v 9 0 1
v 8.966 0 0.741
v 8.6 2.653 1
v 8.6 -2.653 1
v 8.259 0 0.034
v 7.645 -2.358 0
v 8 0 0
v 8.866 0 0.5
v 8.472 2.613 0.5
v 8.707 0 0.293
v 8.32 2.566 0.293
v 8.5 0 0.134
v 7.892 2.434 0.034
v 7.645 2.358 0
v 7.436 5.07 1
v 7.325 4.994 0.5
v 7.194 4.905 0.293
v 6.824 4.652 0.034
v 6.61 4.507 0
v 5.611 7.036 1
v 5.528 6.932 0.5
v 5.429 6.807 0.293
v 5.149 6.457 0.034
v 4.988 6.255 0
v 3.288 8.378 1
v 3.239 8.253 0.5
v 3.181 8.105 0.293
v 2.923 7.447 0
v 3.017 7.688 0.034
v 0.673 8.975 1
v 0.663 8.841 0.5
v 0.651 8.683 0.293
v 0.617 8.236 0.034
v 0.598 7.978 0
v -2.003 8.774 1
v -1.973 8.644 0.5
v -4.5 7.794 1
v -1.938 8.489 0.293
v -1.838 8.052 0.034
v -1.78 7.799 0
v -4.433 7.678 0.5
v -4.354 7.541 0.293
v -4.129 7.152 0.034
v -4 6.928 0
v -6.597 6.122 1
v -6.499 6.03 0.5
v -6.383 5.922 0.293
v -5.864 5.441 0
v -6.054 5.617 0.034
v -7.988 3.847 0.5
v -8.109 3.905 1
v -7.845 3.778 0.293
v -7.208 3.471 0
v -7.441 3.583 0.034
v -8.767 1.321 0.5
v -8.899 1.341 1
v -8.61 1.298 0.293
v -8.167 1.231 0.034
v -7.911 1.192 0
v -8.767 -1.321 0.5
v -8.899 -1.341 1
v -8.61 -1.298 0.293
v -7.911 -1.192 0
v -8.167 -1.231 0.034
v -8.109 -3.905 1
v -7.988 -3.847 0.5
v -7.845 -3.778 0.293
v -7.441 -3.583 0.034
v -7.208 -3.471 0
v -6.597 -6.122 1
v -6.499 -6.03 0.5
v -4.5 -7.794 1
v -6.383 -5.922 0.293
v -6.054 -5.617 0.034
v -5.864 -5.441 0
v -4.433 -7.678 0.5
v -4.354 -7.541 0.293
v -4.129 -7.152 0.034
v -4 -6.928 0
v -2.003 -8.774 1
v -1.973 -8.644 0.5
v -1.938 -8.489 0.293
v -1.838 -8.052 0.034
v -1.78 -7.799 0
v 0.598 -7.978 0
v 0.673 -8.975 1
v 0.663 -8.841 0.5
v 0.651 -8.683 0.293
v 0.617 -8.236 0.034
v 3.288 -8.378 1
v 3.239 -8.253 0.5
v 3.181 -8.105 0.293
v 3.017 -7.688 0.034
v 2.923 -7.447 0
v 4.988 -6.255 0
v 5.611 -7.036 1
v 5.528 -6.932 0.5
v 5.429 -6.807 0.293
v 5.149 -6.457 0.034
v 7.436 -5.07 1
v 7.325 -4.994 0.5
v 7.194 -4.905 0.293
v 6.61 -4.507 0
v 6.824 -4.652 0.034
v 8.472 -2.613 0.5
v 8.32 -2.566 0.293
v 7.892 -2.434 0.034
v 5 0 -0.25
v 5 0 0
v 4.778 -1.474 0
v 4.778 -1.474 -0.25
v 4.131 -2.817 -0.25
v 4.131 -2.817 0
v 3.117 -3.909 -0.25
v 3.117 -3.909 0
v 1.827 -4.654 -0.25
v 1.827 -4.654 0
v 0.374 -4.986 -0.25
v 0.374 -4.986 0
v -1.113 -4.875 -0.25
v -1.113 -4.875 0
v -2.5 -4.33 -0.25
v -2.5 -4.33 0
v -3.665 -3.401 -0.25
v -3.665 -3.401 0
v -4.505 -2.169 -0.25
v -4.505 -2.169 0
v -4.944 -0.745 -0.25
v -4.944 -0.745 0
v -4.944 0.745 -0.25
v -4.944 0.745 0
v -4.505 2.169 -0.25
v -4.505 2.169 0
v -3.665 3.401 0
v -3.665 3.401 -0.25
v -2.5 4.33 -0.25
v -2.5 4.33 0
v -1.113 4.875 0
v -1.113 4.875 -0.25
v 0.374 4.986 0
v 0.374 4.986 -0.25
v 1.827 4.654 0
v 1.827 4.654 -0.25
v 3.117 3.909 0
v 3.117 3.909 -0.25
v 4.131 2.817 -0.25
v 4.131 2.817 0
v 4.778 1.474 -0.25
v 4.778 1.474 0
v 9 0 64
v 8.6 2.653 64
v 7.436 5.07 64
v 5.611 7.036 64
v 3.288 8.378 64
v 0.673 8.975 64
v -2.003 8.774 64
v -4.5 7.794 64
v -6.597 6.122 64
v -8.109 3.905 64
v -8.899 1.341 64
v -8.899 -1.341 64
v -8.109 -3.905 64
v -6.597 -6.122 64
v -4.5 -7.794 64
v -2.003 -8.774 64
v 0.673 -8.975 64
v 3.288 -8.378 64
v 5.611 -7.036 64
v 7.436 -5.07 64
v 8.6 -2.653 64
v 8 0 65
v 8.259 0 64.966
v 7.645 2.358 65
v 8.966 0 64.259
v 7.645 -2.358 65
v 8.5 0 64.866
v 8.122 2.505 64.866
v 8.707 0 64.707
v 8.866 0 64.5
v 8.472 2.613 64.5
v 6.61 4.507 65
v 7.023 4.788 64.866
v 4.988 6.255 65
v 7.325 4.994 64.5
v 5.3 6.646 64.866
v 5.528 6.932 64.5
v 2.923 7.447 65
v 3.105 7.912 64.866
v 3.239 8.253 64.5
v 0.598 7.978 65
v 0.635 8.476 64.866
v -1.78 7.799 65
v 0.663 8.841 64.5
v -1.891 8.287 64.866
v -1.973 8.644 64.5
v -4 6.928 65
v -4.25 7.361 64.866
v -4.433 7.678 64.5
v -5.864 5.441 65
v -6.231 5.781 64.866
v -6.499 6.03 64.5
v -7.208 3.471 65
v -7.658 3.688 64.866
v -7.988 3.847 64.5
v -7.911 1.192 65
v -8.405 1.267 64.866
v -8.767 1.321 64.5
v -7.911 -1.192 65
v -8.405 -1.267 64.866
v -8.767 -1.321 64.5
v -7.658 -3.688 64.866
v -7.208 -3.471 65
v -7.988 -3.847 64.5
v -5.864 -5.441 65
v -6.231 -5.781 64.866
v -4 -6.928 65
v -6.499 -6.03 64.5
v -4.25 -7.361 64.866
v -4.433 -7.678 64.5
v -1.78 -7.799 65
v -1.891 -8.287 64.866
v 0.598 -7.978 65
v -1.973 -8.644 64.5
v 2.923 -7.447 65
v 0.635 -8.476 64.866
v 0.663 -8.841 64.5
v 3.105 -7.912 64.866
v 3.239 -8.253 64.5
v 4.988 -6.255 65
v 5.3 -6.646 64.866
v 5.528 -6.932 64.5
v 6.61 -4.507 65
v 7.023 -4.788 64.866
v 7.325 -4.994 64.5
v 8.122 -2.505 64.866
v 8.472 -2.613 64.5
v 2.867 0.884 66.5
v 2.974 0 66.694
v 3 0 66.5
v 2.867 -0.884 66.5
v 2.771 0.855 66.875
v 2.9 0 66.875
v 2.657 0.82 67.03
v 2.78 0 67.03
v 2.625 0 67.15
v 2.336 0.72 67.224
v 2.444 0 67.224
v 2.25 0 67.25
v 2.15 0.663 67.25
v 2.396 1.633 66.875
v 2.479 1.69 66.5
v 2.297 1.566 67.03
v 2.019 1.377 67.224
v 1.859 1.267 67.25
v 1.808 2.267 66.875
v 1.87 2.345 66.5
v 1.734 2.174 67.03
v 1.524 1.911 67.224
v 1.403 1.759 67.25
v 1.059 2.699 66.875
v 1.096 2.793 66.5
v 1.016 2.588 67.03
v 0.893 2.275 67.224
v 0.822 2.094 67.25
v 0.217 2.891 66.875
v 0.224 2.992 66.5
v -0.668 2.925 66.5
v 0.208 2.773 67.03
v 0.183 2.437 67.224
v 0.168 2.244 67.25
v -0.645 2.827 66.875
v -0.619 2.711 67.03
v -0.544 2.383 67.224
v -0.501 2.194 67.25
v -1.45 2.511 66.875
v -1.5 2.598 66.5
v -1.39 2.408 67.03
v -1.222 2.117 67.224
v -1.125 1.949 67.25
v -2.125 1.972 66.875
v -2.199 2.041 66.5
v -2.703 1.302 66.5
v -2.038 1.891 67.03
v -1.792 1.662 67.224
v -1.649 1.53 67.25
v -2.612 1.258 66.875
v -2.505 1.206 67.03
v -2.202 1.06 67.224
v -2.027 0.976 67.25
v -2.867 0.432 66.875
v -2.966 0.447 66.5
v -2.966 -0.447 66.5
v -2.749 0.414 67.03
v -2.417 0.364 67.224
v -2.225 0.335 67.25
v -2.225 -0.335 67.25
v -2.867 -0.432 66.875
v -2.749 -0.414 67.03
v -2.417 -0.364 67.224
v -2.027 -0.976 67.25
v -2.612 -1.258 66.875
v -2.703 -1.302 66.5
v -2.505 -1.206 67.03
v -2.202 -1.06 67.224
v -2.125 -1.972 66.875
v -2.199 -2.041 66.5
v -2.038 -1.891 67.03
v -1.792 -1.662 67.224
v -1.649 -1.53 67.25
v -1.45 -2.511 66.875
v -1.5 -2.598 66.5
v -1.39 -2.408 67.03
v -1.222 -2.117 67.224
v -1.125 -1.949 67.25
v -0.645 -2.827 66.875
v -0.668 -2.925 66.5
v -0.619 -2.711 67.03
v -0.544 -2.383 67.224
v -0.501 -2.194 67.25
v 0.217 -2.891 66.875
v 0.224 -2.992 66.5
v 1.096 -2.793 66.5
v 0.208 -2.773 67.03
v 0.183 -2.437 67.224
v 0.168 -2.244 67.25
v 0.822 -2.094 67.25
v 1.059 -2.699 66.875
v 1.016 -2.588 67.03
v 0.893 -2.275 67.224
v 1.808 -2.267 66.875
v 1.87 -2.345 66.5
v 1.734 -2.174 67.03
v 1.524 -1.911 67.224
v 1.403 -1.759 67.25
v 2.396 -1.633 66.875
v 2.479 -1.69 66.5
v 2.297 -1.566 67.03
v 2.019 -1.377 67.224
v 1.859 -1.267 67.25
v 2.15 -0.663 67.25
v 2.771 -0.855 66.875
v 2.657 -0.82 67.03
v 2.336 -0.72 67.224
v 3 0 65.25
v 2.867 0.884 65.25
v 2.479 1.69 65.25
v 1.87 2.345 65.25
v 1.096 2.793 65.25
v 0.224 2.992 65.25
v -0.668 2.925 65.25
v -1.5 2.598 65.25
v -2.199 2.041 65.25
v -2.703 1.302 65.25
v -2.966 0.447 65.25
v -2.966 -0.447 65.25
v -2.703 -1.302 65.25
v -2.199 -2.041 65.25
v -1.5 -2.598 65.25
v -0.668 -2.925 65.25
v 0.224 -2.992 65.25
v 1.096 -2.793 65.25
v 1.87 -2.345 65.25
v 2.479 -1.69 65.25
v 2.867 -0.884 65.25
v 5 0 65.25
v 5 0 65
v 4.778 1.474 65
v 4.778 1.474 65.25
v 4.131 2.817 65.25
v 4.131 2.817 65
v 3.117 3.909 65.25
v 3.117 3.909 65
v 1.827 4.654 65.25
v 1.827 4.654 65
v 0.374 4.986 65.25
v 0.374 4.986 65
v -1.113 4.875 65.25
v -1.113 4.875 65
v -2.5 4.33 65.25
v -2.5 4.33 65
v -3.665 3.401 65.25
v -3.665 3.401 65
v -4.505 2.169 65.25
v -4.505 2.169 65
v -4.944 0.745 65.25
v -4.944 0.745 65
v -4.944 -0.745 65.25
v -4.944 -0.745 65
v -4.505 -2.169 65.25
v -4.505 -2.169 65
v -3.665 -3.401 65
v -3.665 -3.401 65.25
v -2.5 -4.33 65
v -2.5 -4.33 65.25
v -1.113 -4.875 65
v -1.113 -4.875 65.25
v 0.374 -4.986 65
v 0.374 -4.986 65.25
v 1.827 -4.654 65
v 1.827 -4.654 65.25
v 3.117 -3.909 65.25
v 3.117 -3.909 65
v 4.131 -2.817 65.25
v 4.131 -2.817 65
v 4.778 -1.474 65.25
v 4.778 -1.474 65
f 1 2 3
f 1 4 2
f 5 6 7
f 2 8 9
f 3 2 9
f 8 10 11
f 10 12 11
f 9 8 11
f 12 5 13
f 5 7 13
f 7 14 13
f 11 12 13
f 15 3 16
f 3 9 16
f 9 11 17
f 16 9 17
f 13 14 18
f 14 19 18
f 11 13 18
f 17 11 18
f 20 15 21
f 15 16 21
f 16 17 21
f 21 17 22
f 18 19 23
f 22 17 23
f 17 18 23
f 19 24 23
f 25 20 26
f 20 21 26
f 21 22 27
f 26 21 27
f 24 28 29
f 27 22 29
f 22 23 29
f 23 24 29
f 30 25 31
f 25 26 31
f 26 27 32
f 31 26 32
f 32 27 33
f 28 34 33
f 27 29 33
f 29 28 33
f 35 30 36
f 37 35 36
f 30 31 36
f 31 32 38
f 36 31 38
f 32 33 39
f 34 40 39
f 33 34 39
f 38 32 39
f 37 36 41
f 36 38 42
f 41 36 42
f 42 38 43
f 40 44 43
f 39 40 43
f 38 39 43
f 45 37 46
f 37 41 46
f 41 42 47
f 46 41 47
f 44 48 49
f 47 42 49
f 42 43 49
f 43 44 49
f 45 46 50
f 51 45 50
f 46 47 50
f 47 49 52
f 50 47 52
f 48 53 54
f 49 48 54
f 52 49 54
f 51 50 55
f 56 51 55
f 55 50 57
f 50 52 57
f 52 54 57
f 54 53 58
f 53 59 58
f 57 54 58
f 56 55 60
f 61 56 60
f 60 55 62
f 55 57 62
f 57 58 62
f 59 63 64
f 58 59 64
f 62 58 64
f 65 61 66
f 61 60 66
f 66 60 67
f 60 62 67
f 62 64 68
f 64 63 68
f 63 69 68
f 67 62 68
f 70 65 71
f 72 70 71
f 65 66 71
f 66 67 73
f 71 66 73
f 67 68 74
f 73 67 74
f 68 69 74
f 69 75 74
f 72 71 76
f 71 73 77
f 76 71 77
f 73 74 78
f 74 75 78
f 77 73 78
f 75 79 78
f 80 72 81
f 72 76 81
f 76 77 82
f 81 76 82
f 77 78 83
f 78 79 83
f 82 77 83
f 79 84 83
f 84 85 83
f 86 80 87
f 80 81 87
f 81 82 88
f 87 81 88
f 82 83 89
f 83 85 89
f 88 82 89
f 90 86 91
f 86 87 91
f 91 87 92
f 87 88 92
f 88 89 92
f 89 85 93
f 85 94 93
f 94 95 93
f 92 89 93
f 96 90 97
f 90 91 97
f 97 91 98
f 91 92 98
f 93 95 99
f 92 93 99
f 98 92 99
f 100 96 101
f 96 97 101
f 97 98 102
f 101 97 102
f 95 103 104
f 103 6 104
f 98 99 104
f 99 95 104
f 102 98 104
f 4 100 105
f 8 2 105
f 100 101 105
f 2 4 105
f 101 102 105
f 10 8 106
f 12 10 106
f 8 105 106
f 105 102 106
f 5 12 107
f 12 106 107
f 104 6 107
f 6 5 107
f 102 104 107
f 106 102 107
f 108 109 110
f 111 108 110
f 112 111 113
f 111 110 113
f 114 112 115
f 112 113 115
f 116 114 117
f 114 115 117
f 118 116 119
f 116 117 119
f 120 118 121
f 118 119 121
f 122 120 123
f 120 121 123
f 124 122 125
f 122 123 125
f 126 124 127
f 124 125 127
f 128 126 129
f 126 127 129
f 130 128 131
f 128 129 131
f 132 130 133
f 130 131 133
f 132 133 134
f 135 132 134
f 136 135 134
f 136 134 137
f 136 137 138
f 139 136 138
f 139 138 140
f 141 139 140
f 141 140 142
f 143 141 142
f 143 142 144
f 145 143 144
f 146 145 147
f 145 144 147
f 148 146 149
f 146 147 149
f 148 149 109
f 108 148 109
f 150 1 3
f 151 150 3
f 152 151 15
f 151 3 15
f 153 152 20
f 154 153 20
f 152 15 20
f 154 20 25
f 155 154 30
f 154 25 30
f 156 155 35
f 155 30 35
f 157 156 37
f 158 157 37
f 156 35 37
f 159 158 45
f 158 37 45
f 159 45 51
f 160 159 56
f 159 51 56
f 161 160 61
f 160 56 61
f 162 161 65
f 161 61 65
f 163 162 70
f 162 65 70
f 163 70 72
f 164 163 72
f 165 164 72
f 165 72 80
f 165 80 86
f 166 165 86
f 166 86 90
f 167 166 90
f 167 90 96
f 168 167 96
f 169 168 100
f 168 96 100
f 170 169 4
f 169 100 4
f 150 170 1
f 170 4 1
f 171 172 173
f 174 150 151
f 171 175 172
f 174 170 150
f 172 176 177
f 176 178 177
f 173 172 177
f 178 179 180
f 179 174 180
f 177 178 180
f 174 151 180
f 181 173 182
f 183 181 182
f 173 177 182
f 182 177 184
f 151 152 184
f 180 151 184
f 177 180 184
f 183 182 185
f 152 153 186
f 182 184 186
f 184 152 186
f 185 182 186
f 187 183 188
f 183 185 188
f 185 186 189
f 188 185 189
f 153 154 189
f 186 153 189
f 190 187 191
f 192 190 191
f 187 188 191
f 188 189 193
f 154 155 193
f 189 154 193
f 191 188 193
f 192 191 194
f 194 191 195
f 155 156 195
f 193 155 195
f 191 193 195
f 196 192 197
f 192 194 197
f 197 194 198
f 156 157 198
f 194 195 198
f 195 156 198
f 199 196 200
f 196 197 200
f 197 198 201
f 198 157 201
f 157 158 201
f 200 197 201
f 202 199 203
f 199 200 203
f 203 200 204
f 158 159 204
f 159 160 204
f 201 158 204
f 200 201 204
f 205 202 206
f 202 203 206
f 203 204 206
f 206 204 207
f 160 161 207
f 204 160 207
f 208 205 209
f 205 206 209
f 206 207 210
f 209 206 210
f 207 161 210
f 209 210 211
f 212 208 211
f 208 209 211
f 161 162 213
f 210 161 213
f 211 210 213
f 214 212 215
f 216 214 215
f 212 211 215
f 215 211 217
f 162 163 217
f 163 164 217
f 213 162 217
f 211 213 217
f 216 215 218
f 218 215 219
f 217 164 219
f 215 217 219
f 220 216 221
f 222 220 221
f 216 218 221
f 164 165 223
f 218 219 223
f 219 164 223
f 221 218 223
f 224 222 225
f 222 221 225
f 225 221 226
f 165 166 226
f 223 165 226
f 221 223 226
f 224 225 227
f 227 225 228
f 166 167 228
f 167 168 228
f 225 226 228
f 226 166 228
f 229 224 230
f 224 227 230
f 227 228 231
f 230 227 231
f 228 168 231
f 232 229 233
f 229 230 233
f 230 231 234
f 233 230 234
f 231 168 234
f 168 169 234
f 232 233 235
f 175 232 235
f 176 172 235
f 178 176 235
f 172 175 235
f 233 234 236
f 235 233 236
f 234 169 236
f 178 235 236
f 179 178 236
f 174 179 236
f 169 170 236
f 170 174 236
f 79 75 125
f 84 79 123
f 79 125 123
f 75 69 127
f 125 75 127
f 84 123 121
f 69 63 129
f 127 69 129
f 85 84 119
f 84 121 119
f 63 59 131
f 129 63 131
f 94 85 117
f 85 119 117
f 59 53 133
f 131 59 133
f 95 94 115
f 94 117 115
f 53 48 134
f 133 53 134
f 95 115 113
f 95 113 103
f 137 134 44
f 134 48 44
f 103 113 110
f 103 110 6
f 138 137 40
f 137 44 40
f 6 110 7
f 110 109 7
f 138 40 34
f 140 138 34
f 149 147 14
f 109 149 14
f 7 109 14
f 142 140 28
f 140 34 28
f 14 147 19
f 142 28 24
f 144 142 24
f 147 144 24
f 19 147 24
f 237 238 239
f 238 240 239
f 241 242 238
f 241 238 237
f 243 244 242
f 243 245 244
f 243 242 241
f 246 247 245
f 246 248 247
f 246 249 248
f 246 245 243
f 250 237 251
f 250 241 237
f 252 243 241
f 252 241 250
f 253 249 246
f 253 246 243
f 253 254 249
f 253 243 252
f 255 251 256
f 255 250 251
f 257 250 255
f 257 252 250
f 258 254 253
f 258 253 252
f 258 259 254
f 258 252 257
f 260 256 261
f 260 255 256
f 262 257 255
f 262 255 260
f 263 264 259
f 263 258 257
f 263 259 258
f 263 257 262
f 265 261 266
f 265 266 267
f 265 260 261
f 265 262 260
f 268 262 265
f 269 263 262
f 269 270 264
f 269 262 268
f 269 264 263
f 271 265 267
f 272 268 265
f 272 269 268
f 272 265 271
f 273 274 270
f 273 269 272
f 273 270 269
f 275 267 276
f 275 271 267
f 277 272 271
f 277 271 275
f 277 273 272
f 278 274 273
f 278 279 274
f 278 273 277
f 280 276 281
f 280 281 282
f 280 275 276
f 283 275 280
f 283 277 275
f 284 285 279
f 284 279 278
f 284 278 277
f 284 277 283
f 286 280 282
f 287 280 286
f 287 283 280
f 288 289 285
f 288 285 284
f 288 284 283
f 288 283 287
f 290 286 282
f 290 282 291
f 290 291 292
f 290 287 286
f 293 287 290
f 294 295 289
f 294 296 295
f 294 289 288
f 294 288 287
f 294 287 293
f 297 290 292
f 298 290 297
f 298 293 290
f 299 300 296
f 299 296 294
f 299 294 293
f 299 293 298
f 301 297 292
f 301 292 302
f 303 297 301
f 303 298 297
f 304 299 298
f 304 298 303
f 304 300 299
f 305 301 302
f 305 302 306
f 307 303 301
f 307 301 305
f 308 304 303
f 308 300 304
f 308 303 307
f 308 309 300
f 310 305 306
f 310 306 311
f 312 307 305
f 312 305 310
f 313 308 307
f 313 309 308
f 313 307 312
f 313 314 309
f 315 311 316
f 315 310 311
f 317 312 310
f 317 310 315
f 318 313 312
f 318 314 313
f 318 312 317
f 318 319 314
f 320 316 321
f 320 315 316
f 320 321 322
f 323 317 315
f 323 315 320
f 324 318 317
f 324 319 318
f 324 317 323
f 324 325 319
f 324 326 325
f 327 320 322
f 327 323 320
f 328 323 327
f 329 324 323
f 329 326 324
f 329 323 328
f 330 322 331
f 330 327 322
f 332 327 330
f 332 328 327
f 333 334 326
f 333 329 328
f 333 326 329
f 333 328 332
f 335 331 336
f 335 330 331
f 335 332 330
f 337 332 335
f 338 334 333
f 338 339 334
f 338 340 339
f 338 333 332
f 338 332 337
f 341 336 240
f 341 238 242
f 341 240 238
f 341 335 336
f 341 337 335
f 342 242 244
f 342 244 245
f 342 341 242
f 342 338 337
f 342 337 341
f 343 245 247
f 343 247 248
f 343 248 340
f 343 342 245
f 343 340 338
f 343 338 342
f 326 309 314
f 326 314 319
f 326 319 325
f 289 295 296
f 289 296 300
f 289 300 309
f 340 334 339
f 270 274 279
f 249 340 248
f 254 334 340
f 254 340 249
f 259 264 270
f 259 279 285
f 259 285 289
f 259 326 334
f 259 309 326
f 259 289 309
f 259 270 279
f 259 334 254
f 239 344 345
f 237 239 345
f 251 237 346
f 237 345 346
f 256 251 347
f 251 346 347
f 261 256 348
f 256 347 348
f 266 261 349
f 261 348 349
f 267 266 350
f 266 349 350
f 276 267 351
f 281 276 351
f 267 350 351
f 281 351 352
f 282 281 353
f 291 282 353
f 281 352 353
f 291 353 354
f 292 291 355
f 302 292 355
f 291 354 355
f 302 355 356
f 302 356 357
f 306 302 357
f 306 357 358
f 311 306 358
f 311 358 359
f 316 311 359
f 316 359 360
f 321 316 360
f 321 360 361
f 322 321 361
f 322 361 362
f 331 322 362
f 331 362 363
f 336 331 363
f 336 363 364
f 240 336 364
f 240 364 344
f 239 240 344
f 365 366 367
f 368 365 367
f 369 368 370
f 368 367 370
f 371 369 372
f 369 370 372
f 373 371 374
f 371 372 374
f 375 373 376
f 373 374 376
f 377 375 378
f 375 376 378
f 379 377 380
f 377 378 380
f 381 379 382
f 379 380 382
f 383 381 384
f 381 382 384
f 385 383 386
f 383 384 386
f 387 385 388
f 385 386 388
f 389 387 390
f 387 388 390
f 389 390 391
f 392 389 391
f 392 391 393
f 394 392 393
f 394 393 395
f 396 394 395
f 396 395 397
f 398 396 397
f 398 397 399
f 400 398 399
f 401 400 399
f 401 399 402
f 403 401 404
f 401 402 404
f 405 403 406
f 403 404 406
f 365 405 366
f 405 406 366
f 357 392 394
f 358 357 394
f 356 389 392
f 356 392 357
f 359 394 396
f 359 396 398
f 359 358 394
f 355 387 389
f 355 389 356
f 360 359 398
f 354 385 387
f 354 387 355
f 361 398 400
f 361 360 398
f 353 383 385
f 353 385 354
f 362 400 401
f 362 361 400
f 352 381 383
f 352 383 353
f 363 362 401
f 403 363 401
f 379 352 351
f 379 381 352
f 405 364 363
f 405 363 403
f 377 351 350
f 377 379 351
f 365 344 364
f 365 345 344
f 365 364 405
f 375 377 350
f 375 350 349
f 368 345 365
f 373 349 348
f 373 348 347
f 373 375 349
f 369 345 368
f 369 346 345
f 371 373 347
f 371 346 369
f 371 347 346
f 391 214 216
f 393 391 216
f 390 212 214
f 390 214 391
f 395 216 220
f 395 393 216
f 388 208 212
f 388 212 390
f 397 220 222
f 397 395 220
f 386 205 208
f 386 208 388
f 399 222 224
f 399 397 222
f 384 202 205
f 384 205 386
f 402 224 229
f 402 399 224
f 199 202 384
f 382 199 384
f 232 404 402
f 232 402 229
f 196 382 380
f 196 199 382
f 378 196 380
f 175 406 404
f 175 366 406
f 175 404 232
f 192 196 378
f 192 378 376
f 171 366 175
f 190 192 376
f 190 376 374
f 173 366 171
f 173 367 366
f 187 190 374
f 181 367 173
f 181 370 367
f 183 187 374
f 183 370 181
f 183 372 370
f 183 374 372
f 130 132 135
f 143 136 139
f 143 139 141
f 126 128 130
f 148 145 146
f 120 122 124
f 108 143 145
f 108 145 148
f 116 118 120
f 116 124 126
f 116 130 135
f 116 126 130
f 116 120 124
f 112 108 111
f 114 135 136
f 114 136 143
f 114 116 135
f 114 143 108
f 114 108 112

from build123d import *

# Parameters (mm, degrees)
SKETCH_R     = 9
PAD_DEPTH    = 65
SKETCH001_R  = 3
PAD001_DEPTH = 2.25
FILLET_R     = 0.75
FILLET001_R  = 1
SKETCH002_R  = 5
PAD002_DEPTH = 0.25
SKETCH003_R  = 5
PAD003_DEPTH = 0.25


with BuildPart() as part:
    # Sketch → Pad (new body)
    with BuildSketch(Plane.XY):
        Circle(SKETCH_R)
    extrude(amount=PAD_DEPTH)

    # Sketch001 (on Face3 of Pad) → Pad001 (join)
    with BuildSketch(Plane.XY.offset(65)):
        Circle(SKETCH001_R)
    extrude(amount=PAD001_DEPTH)

    # Fillet
    fillet_edges = [part.edges().sort_by_distance(p)[0] for p in [
        (-3, 0, 67.25),
    ]]
    fillet(fillet_edges, radius=FILLET_R)

    # Fillet001
    fillet001_edges = [part.edges().sort_by_distance(p)[0] for p in [
        (-9, 0, 0),
        (-9, 0, 65),
    ]]
    fillet(fillet001_edges, radius=FILLET001_R)

    # Sketch002 (on Face1 of Fillet001) → Pad002 (join)
    with BuildSketch(Plane.XY.offset(65)):
        Circle(SKETCH002_R)
    extrude(amount=PAD002_DEPTH)

    # Sketch003 (on Face8 of Pad002) → Pad003 (join)
    with BuildSketch(Plane(origin=(0, 0, 0), x_dir=(1, 0, 0), z_dir=(0, 0, -1))):
        Circle(SKETCH003_R)
    extrude(amount=PAD003_DEPTH)


solid = part.part
